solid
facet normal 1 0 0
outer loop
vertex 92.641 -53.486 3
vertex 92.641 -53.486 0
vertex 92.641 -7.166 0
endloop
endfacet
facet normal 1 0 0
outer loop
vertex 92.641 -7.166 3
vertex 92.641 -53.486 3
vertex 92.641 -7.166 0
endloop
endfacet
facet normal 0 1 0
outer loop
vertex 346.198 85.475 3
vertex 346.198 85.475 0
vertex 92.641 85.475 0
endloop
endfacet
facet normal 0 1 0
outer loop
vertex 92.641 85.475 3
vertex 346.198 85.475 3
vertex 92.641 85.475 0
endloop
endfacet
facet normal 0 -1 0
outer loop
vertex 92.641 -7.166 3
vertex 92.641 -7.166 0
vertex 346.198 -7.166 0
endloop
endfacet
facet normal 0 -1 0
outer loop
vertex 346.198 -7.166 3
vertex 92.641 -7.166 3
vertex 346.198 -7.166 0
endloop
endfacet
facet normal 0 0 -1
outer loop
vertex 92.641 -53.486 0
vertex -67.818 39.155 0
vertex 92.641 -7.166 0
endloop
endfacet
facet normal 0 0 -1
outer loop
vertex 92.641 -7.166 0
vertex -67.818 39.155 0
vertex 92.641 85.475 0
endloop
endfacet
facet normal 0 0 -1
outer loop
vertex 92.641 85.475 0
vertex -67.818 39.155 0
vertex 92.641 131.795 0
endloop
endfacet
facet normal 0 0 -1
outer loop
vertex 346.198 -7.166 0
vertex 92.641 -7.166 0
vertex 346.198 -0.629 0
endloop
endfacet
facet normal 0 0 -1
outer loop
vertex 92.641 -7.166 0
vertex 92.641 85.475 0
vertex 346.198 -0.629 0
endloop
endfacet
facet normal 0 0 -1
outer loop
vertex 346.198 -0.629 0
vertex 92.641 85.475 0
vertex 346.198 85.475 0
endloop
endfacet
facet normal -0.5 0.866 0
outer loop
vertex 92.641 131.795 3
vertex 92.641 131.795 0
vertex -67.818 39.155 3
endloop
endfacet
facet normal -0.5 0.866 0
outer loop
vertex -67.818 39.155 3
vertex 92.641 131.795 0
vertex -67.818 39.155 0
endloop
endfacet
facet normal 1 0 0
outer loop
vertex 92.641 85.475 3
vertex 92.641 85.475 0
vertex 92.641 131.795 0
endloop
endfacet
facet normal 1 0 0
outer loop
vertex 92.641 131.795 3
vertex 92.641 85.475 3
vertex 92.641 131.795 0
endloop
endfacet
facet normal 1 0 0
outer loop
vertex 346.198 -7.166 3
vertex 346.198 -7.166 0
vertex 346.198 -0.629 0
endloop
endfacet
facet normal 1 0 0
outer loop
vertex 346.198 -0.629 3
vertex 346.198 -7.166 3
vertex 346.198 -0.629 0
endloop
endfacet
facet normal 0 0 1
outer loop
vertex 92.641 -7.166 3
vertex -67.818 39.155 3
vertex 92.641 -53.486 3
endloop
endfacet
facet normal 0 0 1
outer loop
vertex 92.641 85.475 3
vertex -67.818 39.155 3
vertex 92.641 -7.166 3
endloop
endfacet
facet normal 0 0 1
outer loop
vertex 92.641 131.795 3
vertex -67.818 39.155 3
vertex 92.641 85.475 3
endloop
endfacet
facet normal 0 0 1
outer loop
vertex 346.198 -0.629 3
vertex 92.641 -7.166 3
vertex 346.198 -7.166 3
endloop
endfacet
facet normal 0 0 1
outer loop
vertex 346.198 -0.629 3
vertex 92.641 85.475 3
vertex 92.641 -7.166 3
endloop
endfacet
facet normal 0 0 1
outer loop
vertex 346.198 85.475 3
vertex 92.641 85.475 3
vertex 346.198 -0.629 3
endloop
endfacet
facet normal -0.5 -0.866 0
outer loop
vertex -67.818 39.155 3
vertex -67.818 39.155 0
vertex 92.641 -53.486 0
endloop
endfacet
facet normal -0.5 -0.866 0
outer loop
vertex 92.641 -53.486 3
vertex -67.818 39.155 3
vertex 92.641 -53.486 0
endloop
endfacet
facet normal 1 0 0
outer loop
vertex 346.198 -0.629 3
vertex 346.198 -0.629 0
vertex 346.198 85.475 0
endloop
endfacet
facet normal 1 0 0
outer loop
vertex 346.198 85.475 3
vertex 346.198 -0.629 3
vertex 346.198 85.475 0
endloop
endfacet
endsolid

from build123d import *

# Parameters (mm, degrees)
F1_DEPTH = 3
F2_ANGLE = 30


with BuildPart() as f1:
    # F0 (on Top) → F1 (new body)
    with BuildSketch(Plane.XY):
        Polygon((-92.6405740249, -53.4860603511), (92.6405740249, -53.4860603511), (69.4804305186, -13.3715150878), (173.2050807569, 46.5139396489), (289.0674983355, 113.4071376268), (285.7992481602, 119.0679129823), (242.747211323, 193.6362281535), (126.8847937445, 126.7430301756), (23.1601435062, 66.8575754389), (0, 106.9721207023), align=None)
    extrude(amount=F1_DEPTH)


with BuildPart() as f1_1:
    # F2: moved
    add(f1.part.rotate(Axis((92.6405740249, -53.4860603511, 1.5), (0, 0, -1)), F2_ANGLE))


solid = f1_1.part
